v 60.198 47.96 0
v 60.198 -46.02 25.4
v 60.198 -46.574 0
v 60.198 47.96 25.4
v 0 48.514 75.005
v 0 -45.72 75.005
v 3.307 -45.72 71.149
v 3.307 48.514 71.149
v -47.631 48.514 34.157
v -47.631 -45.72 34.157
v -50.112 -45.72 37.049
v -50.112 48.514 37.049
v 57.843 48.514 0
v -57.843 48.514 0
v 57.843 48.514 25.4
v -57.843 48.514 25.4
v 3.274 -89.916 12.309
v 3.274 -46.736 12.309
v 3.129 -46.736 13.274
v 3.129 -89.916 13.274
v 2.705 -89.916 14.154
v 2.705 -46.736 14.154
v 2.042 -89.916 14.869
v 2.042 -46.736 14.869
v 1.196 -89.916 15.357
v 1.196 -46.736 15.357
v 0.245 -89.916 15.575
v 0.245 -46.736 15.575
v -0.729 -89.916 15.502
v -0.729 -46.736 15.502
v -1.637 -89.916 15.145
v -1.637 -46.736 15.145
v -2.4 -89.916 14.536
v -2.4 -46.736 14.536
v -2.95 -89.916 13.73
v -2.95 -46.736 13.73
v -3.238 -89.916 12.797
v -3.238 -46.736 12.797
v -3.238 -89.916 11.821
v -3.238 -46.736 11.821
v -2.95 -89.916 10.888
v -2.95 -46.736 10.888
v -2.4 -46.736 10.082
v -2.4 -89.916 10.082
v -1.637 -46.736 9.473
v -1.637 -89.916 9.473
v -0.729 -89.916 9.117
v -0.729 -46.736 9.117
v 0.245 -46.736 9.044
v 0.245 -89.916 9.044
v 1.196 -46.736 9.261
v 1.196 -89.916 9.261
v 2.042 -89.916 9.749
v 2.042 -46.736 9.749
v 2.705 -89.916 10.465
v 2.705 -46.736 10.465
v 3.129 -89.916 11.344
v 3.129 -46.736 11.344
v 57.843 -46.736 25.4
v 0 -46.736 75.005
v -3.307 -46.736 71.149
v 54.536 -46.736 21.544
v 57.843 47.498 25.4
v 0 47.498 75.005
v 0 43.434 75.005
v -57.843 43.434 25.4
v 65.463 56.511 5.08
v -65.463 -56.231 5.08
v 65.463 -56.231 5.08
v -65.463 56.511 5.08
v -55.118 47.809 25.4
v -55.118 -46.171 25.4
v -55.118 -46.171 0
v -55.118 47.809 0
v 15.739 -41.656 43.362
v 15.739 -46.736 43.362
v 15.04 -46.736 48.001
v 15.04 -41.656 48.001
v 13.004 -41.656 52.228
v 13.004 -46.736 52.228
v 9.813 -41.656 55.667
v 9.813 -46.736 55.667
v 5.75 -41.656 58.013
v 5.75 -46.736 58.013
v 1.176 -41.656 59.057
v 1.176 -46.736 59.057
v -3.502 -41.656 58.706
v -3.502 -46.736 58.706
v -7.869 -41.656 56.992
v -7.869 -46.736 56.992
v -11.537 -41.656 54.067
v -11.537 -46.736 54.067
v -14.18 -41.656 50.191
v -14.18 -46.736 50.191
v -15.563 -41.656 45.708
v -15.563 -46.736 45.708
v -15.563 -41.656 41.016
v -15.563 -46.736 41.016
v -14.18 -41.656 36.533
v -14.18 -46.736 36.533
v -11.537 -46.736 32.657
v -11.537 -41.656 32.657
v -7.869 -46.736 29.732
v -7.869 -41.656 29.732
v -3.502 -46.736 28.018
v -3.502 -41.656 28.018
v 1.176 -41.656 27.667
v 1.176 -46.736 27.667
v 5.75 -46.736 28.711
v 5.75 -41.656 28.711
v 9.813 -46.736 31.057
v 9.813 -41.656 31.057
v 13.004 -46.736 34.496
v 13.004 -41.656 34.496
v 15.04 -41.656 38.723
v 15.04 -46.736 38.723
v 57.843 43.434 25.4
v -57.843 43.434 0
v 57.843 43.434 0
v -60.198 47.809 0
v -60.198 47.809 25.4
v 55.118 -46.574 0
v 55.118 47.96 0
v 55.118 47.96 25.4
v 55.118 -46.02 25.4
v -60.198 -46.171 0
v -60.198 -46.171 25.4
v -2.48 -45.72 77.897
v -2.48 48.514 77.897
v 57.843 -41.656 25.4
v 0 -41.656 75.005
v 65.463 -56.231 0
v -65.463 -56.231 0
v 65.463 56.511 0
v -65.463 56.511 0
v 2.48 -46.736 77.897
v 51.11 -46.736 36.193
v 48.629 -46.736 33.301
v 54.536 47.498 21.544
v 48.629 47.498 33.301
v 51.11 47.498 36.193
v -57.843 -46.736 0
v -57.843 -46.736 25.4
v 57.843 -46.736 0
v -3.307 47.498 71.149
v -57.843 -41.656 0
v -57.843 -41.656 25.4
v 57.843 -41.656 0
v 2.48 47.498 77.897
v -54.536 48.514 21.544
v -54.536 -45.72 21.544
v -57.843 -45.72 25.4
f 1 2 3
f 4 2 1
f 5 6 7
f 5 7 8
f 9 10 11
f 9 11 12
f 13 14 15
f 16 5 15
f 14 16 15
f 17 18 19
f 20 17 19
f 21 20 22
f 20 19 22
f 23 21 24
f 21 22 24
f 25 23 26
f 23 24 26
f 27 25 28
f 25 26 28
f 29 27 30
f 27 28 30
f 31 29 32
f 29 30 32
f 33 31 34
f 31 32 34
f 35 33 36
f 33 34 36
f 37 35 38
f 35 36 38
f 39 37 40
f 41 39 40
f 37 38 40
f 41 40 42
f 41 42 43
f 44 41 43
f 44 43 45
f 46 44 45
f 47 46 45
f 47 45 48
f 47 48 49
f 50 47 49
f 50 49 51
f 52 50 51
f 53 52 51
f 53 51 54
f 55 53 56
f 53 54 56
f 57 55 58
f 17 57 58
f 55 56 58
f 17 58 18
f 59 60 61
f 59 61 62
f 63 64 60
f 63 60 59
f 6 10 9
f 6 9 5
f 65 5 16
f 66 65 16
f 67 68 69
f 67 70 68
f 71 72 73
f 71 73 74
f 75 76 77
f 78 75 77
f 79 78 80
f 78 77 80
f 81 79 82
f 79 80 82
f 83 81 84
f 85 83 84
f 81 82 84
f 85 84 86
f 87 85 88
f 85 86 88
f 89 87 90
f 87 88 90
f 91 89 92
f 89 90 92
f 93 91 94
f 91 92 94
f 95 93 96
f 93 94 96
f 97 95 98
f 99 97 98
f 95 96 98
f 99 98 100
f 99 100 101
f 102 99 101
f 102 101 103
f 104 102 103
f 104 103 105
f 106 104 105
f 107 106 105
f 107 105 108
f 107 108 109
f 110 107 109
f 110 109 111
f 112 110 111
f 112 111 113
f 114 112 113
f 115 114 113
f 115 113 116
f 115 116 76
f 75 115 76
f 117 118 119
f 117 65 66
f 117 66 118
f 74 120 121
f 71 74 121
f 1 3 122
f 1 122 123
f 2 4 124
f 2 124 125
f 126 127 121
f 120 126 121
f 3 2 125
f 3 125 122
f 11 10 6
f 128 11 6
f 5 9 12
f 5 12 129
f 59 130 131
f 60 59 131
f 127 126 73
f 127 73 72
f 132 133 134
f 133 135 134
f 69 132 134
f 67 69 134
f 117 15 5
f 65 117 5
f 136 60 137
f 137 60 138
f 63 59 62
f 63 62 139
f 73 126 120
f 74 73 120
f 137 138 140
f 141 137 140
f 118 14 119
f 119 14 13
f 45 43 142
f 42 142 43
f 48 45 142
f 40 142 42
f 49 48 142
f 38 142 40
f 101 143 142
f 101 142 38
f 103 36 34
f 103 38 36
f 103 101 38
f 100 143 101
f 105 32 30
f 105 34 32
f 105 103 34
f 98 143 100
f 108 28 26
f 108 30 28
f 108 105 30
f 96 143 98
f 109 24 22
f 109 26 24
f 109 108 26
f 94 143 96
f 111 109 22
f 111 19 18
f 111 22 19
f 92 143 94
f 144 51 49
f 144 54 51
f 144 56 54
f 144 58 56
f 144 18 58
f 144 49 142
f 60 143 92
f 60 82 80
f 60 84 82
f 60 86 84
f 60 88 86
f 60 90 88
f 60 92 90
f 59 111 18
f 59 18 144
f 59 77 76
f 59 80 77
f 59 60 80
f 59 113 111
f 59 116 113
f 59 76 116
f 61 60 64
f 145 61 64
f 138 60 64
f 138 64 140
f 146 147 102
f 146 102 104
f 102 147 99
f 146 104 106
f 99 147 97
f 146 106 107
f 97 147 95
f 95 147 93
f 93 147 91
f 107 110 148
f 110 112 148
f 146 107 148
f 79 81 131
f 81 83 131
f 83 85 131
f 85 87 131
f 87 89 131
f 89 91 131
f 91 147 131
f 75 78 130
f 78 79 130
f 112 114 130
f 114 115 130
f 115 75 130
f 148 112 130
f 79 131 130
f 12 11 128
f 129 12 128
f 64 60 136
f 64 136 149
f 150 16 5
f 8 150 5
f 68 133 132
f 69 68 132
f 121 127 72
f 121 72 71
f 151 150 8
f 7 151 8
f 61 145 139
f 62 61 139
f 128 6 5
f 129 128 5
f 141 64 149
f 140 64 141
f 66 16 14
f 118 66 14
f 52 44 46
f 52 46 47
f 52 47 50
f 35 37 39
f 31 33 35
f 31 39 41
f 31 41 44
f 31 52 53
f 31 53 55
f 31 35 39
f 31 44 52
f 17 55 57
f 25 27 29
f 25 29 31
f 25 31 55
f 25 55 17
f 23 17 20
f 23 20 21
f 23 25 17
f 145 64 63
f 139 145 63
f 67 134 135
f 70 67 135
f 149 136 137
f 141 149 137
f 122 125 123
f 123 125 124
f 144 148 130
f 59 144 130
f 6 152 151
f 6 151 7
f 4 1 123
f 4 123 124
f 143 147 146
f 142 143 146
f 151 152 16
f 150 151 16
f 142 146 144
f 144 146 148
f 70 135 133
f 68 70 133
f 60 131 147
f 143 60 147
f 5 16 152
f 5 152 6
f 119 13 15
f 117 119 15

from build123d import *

# Parameters (mm, degrees)
F1_DEPTH  = 5.08
F4_DEPTH  = 5.08
F6_W      = 93.98
F6_H      = 25.4
F7_DEPTH  = 5.08
F10_DEPTH = 5.08
F13_DEPTH = 5.08
F14_W     = 76.2
F14_H     = 94.234
F15_DEPTH = 5.08
F16_W     = 76.2
F16_H     = 94.234
F17_DEPTH = 5.08
F18_R     = 15.738877225
F19_DEPTH = 59.944
F20_R     = 3.274453398
F21_DEPTH = 43.18
F22_W     = 64.0627496209
F22_H     = 94.234
F23_DEPTH = 3.81
F24_W     = 62.747863529
F24_H     = 94.234
F25_DEPTH = 3.81


with BuildPart() as f1:
    # F0 (on Top) → F1 (new body)
    with BuildSketch(Plane.XY):
        Polygon((-65.4627308249, -56.230802089), (0, -56.230802089), (65.4627308249, -56.230802089), (65.4627308249, 56.5105602145), (0, 56.5105602145), (-65.4627308249, 56.5105602145), align=None)
    extrude(amount=F1_DEPTH)


with BuildPart() as f4:
    # F3 (on offset) → F4 (new body)
    with BuildSketch(Plane.XZ.offset(41.656)):
        Polygon((-57.8427308249, 0), (57.8427308249, 0), (57.8427308249, 25.4), (0, 75.0050248535), (-57.8427308249, 25.4), align=None)
    extrude(amount=F4_DEPTH)

    # F18 (on face) → F19 (cut)
    with BuildSketch(Plane.XZ.offset(46.736)):
        with Locations((0, 43.3620624244)):
            Circle(F18_R)
    extrude(amount=-F19_DEPTH, mode=Mode.SUBTRACT)

    # F20 (on face) → F21 (join)
    with BuildSketch(Plane.XZ.offset(46.736)):
        with Locations((0, 12.3092317954)):
            Circle(F20_R)
    extrude(amount=F21_DEPTH)


with BuildPart() as f7:
    # F6 (on offset) → F7 (new body)
    with BuildSketch(Plane.YZ.offset(-60.198)):
        with Locations((0.8187752477, 12.7)):
            Rectangle(F6_W, F6_H)
    extrude(amount=F7_DEPTH)


with BuildPart() as f10:
    # F9 (on offset) → F10 (new body)
    with BuildSketch(Plane.YZ.offset(60.198)):
        Polygon((47.9602938963, 25.4), (-46.0197061037, 25.4), (-46.574158704, 0), (47.9602938963, 0), align=None)
    extrude(amount=-F10_DEPTH)


with BuildPart() as f13:
    # F12 (on offset) → F13 (new body)
    with BuildSketch(Plane.XZ.offset(-48.514)):
        Polygon((-57.8427308249, 0), (57.8427308249, 0), (57.8427308249, 25.4), (0, 75.0050248535), (-57.8427308249, 25.4), align=None)
    extrude(amount=F13_DEPTH)


with BuildPart() as f15:
    # F14 (on face) → F15 (new body)
    with BuildSketch(Plane(origin=(37.0642209813, 0, 43.2193263443), x_dir=(0.7590909557, 0, -0.6509845781), z_dir=(0.6509845781, 0, 0.7590909557))):
        with Locations((-10.7271144618, 0.381)):
            Rectangle(F14_W, F14_H)
    extrude(amount=-F15_DEPTH)


with BuildPart() as f17:
    # F16 (on face) → F17 (new body)
    with BuildSketch(Plane(origin=(-37.0642209813, 0, 43.2193263443), x_dir=(0.7590909557, 0, 0.6509845781), z_dir=(-0.6509845781, 0, 0.7590909557))):
        with Locations((10.7271144618, 1.397)):
            Rectangle(F16_W, F16_H)
    extrude(amount=-F17_DEPTH)


with BuildPart() as f23:
    # F22 (on face) → F23 (new body)
    with BuildSketch(Plane(origin=(37.0642209813, 0, 43.2193263443), x_dir=(0.7590909557, 0, -0.6509845781), z_dir=(0.6509845781, 0, 0.7590909557))):
        with Locations((-16.7957396514, 0.381)):
            Rectangle(F22_W, F22_H)
    extrude(amount=F23_DEPTH)


with BuildPart() as f25:
    # F24 (on face) → F25 (new body)
    with BuildSketch(Plane(origin=(-37.0642209813, 0, 43.2193263443), x_dir=(0.7590909557, 0, 0.6509845781), z_dir=(-0.6509845781, 0, 0.7590909557))):
        with Locations((17.4531826973, 1.397)):
            Rectangle(F24_W, F24_H)
    extrude(amount=F25_DEPTH)


solid = Compound([f1.part, f4.part, f7.part, f10.part, f13.part, f15.part, f17.part, f23.part, f25.part])
